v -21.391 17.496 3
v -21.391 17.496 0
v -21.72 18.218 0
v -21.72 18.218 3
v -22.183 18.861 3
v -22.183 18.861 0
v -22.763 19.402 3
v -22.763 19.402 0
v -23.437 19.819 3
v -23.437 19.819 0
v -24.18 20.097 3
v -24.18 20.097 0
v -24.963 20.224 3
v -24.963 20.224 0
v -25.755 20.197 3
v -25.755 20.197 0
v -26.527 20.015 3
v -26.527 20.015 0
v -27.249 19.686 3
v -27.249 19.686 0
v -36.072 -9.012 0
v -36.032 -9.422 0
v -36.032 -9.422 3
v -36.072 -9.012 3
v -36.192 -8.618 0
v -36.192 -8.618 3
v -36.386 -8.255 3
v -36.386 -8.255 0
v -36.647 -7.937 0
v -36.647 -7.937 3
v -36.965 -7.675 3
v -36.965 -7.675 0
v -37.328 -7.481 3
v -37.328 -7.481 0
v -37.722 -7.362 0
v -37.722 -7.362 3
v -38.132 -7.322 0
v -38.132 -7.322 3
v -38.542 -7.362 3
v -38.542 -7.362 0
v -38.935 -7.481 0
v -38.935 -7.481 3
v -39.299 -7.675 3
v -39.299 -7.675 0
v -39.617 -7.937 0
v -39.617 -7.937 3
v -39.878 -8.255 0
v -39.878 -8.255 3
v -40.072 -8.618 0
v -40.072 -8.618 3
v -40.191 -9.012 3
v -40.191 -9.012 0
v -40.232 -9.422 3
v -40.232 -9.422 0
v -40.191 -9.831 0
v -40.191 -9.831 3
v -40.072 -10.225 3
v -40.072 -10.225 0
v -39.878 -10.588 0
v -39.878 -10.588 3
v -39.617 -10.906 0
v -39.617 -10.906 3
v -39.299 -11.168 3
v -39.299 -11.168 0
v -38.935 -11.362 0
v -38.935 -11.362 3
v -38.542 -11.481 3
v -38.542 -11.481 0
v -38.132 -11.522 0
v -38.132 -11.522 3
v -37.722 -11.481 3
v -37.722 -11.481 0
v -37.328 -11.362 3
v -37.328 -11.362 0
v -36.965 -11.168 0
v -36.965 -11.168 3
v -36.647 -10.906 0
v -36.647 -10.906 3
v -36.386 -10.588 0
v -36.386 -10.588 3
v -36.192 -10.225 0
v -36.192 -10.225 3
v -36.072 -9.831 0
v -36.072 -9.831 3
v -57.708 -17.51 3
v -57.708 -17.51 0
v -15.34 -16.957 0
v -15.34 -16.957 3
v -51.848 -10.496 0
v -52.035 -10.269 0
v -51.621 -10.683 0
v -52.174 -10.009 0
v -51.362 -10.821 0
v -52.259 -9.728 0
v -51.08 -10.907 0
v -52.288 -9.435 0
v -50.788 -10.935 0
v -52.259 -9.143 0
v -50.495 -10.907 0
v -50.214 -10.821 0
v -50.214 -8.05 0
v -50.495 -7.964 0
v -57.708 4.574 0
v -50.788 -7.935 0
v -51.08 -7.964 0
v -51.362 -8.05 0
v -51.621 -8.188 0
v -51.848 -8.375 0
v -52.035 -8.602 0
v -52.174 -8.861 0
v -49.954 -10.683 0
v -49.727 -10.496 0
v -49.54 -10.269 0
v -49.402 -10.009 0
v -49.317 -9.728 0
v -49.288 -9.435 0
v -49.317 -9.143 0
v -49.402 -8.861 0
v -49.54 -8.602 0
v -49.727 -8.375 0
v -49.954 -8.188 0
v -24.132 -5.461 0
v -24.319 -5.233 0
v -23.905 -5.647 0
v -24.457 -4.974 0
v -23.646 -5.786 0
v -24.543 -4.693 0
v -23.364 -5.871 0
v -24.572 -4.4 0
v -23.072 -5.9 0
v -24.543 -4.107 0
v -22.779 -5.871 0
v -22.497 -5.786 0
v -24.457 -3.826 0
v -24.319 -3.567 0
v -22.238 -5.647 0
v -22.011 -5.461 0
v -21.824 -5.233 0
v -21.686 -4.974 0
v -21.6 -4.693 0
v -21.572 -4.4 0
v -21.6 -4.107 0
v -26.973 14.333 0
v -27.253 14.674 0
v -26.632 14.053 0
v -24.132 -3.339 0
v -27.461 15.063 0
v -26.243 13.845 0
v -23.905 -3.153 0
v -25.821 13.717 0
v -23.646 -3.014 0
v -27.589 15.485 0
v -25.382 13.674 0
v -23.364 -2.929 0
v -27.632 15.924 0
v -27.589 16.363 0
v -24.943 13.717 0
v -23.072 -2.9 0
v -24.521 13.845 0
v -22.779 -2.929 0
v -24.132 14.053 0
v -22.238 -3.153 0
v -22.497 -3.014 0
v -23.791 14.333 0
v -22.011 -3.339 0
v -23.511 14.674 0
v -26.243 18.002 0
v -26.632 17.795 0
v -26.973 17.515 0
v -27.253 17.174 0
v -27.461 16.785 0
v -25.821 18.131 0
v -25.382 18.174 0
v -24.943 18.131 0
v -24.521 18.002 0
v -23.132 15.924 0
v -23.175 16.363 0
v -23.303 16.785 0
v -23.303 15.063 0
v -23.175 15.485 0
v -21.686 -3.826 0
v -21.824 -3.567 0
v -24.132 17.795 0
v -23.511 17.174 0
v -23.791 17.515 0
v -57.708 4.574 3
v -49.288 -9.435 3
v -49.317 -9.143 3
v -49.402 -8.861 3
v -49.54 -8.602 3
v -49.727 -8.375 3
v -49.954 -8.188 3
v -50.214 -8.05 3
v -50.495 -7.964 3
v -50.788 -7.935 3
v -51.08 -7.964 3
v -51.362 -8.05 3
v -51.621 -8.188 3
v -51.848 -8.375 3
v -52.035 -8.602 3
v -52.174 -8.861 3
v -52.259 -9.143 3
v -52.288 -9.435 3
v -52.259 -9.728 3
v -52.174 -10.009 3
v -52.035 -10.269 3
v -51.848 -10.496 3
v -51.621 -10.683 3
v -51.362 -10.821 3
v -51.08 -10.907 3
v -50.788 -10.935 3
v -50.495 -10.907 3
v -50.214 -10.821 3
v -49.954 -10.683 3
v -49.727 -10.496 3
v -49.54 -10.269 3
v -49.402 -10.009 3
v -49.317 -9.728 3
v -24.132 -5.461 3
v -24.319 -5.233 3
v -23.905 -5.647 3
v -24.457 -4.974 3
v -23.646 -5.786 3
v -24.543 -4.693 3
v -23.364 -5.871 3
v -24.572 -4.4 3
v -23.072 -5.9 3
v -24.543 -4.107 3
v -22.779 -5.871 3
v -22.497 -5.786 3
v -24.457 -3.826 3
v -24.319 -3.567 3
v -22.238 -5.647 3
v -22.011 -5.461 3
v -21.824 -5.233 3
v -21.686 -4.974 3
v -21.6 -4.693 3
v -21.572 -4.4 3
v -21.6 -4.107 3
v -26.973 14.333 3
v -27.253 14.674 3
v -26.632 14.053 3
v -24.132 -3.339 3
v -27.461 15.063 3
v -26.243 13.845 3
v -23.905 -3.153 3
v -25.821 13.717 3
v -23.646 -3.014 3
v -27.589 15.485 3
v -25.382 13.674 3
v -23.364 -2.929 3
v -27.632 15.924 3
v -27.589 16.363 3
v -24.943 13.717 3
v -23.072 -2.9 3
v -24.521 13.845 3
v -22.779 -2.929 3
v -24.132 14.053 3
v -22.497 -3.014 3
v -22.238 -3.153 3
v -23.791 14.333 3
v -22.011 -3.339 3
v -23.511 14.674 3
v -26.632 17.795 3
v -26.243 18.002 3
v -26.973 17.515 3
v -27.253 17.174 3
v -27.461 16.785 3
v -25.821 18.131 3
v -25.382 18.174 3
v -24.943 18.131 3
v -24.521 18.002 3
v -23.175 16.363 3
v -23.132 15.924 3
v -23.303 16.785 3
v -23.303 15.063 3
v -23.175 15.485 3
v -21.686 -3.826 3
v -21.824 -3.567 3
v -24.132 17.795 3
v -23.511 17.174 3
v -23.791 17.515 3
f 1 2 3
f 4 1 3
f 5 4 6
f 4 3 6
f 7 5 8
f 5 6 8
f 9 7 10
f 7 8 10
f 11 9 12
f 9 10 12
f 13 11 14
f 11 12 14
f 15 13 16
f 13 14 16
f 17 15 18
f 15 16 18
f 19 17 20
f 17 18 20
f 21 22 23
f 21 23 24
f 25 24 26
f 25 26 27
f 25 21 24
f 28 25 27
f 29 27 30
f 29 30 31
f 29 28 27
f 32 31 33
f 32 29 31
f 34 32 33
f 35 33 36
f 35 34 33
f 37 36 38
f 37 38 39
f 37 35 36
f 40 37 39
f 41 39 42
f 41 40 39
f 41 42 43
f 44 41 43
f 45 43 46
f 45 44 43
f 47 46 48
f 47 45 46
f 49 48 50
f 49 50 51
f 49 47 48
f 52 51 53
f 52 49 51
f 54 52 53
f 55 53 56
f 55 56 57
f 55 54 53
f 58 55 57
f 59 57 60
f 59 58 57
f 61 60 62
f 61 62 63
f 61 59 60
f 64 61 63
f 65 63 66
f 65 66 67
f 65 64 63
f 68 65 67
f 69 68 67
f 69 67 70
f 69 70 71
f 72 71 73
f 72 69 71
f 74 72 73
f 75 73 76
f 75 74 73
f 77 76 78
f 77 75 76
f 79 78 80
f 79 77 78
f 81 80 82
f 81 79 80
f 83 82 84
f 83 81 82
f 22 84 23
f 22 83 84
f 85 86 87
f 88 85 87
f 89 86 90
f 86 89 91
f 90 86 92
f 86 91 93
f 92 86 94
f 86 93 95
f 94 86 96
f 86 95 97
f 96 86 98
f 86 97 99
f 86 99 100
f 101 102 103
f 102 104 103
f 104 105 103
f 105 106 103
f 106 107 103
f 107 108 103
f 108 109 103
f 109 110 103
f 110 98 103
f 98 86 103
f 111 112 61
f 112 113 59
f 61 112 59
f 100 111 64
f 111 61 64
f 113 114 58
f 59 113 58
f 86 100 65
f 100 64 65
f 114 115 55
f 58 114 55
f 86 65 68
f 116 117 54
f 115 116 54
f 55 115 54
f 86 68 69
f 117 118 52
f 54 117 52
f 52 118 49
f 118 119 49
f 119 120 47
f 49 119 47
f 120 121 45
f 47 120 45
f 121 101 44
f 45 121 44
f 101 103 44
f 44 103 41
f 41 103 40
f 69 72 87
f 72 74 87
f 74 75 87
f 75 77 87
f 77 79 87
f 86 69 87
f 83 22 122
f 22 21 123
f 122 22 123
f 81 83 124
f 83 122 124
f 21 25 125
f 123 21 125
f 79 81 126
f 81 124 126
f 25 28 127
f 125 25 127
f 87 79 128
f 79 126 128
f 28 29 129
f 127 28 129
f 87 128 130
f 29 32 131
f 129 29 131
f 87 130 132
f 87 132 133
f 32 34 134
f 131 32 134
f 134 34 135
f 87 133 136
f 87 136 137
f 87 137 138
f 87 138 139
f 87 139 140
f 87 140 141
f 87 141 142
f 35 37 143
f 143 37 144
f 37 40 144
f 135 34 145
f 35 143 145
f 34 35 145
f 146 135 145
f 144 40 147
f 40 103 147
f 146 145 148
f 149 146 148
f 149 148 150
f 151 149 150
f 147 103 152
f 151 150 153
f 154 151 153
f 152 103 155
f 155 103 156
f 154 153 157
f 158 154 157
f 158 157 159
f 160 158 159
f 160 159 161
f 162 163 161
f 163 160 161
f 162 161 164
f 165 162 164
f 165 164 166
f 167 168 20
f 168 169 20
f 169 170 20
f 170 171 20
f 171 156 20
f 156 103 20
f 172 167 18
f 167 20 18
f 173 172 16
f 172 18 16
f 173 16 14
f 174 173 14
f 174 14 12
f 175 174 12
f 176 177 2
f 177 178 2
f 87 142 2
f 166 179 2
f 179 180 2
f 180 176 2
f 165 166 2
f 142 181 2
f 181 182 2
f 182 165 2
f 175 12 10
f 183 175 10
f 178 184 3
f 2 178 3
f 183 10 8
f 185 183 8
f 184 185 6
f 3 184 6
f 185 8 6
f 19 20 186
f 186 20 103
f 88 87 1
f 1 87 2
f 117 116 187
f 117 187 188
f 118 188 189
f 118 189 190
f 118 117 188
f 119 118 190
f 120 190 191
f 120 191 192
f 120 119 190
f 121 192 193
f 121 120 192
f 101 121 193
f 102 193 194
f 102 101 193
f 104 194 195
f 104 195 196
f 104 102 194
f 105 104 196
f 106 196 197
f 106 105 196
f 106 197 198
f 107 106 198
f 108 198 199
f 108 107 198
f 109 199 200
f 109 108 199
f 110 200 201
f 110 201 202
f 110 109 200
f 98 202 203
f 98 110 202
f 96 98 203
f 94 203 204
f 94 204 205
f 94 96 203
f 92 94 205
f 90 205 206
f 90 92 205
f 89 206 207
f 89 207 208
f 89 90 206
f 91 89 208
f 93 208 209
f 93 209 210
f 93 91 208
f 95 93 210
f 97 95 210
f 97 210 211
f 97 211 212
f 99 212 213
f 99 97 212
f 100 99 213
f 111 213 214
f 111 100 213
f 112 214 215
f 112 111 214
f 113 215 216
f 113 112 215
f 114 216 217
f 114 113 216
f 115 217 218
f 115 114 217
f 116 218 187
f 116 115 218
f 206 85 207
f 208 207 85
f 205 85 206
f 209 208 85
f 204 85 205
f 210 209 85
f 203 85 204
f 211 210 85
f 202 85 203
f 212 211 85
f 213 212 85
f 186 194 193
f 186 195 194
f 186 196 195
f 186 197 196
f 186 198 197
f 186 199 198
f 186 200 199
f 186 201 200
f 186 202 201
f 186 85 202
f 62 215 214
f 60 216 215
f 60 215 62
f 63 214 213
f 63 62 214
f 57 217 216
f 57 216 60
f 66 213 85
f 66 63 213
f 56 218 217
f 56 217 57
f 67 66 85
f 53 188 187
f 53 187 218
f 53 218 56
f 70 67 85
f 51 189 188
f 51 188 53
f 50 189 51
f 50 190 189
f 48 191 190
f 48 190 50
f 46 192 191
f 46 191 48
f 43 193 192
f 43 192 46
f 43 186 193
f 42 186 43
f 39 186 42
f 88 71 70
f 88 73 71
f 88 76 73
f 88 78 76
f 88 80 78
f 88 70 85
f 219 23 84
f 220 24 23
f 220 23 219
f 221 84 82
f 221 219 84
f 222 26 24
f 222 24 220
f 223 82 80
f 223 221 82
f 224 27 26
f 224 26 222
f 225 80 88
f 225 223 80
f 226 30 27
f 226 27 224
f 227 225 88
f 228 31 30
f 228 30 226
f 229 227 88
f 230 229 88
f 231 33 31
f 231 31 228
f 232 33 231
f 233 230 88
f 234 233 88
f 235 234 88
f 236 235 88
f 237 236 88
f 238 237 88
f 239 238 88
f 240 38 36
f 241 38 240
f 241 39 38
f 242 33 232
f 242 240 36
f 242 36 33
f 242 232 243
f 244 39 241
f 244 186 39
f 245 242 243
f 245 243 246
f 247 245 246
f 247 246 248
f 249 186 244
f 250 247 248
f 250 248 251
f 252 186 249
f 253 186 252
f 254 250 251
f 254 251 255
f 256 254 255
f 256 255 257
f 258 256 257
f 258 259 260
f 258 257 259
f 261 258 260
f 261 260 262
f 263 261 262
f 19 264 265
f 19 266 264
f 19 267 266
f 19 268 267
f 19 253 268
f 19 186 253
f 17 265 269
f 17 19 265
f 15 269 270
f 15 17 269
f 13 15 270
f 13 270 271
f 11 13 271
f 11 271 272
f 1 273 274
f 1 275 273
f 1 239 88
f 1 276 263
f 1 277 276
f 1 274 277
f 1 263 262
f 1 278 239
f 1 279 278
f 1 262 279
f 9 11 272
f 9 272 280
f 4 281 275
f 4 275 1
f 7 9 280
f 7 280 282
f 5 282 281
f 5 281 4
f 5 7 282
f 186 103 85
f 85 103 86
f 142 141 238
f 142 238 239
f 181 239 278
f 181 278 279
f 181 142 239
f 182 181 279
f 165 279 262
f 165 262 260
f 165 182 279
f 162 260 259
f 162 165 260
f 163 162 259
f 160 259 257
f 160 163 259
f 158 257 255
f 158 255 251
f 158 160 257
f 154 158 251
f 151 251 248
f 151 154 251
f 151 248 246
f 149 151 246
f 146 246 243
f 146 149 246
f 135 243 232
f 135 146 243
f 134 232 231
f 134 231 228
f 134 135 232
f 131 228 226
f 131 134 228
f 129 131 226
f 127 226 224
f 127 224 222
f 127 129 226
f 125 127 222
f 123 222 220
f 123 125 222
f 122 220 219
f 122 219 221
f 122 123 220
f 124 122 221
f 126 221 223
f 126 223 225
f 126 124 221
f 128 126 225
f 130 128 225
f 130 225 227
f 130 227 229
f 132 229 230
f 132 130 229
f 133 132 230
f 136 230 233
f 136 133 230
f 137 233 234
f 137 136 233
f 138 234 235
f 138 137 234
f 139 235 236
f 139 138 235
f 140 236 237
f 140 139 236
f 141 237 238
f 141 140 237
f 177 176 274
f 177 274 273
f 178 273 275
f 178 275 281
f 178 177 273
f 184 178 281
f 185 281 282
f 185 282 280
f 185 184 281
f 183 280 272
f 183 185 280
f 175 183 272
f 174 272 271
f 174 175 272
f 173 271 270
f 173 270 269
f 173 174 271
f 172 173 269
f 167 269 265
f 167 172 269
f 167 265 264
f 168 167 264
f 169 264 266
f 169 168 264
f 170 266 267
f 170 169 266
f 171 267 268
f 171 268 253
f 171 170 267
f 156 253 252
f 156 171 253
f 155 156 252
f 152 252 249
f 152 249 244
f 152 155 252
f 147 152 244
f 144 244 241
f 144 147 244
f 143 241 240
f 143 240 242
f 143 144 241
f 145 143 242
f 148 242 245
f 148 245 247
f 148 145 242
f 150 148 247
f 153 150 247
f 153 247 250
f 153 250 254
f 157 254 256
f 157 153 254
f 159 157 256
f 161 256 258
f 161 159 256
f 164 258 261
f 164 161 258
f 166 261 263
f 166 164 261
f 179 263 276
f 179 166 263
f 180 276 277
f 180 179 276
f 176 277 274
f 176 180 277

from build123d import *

# Parameters (mm, degrees)
SKETCH1_R           = 2.1
SKETCH1_R_2         = 2.25
SKETCH1_R_3         = 1.5
BOSS_EXTRUDE2_DEPTH = 3


with BuildPart() as part:
    # Sketch1 → Boss-Extrude2 (new body)
    with BuildSketch(Plane.XY):
        with BuildLine():
            Line((-27.248541099, 19.686096161), (-57.707535143, 4.573632695))
            Line((-57.707535143, 4.573632695), (-57.707535143, -17.510368624))
            Line((-57.707535143, -17.510368624), (-15.340272848, -16.957179715))
            Line((-15.340272848, -16.957179715), (-21.390839368, 17.496417988))
            ThreePointArc((-21.390839368, 17.496417988), (-23.801885744, 19.97645801), (-27.248541099, 19.686096161))
        make_face()
        with Locations((-38.131817883, -9.421553771)):
            Circle(SKETCH1_R, mode=Mode.SUBTRACT)
        with Locations((-25.381817883, 15.923737268)):
            Circle(SKETCH1_R_2, mode=Mode.SUBTRACT)
        with Locations((-23.071502026, -4.400056763)):
            Circle(SKETCH1_R_3, mode=Mode.SUBTRACT)
        with Locations((-50.787681668, -9.435461189)):
            Circle(SKETCH1_R_3, mode=Mode.SUBTRACT)
    extrude(amount=BOSS_EXTRUDE2_DEPTH)


solid = part.part
